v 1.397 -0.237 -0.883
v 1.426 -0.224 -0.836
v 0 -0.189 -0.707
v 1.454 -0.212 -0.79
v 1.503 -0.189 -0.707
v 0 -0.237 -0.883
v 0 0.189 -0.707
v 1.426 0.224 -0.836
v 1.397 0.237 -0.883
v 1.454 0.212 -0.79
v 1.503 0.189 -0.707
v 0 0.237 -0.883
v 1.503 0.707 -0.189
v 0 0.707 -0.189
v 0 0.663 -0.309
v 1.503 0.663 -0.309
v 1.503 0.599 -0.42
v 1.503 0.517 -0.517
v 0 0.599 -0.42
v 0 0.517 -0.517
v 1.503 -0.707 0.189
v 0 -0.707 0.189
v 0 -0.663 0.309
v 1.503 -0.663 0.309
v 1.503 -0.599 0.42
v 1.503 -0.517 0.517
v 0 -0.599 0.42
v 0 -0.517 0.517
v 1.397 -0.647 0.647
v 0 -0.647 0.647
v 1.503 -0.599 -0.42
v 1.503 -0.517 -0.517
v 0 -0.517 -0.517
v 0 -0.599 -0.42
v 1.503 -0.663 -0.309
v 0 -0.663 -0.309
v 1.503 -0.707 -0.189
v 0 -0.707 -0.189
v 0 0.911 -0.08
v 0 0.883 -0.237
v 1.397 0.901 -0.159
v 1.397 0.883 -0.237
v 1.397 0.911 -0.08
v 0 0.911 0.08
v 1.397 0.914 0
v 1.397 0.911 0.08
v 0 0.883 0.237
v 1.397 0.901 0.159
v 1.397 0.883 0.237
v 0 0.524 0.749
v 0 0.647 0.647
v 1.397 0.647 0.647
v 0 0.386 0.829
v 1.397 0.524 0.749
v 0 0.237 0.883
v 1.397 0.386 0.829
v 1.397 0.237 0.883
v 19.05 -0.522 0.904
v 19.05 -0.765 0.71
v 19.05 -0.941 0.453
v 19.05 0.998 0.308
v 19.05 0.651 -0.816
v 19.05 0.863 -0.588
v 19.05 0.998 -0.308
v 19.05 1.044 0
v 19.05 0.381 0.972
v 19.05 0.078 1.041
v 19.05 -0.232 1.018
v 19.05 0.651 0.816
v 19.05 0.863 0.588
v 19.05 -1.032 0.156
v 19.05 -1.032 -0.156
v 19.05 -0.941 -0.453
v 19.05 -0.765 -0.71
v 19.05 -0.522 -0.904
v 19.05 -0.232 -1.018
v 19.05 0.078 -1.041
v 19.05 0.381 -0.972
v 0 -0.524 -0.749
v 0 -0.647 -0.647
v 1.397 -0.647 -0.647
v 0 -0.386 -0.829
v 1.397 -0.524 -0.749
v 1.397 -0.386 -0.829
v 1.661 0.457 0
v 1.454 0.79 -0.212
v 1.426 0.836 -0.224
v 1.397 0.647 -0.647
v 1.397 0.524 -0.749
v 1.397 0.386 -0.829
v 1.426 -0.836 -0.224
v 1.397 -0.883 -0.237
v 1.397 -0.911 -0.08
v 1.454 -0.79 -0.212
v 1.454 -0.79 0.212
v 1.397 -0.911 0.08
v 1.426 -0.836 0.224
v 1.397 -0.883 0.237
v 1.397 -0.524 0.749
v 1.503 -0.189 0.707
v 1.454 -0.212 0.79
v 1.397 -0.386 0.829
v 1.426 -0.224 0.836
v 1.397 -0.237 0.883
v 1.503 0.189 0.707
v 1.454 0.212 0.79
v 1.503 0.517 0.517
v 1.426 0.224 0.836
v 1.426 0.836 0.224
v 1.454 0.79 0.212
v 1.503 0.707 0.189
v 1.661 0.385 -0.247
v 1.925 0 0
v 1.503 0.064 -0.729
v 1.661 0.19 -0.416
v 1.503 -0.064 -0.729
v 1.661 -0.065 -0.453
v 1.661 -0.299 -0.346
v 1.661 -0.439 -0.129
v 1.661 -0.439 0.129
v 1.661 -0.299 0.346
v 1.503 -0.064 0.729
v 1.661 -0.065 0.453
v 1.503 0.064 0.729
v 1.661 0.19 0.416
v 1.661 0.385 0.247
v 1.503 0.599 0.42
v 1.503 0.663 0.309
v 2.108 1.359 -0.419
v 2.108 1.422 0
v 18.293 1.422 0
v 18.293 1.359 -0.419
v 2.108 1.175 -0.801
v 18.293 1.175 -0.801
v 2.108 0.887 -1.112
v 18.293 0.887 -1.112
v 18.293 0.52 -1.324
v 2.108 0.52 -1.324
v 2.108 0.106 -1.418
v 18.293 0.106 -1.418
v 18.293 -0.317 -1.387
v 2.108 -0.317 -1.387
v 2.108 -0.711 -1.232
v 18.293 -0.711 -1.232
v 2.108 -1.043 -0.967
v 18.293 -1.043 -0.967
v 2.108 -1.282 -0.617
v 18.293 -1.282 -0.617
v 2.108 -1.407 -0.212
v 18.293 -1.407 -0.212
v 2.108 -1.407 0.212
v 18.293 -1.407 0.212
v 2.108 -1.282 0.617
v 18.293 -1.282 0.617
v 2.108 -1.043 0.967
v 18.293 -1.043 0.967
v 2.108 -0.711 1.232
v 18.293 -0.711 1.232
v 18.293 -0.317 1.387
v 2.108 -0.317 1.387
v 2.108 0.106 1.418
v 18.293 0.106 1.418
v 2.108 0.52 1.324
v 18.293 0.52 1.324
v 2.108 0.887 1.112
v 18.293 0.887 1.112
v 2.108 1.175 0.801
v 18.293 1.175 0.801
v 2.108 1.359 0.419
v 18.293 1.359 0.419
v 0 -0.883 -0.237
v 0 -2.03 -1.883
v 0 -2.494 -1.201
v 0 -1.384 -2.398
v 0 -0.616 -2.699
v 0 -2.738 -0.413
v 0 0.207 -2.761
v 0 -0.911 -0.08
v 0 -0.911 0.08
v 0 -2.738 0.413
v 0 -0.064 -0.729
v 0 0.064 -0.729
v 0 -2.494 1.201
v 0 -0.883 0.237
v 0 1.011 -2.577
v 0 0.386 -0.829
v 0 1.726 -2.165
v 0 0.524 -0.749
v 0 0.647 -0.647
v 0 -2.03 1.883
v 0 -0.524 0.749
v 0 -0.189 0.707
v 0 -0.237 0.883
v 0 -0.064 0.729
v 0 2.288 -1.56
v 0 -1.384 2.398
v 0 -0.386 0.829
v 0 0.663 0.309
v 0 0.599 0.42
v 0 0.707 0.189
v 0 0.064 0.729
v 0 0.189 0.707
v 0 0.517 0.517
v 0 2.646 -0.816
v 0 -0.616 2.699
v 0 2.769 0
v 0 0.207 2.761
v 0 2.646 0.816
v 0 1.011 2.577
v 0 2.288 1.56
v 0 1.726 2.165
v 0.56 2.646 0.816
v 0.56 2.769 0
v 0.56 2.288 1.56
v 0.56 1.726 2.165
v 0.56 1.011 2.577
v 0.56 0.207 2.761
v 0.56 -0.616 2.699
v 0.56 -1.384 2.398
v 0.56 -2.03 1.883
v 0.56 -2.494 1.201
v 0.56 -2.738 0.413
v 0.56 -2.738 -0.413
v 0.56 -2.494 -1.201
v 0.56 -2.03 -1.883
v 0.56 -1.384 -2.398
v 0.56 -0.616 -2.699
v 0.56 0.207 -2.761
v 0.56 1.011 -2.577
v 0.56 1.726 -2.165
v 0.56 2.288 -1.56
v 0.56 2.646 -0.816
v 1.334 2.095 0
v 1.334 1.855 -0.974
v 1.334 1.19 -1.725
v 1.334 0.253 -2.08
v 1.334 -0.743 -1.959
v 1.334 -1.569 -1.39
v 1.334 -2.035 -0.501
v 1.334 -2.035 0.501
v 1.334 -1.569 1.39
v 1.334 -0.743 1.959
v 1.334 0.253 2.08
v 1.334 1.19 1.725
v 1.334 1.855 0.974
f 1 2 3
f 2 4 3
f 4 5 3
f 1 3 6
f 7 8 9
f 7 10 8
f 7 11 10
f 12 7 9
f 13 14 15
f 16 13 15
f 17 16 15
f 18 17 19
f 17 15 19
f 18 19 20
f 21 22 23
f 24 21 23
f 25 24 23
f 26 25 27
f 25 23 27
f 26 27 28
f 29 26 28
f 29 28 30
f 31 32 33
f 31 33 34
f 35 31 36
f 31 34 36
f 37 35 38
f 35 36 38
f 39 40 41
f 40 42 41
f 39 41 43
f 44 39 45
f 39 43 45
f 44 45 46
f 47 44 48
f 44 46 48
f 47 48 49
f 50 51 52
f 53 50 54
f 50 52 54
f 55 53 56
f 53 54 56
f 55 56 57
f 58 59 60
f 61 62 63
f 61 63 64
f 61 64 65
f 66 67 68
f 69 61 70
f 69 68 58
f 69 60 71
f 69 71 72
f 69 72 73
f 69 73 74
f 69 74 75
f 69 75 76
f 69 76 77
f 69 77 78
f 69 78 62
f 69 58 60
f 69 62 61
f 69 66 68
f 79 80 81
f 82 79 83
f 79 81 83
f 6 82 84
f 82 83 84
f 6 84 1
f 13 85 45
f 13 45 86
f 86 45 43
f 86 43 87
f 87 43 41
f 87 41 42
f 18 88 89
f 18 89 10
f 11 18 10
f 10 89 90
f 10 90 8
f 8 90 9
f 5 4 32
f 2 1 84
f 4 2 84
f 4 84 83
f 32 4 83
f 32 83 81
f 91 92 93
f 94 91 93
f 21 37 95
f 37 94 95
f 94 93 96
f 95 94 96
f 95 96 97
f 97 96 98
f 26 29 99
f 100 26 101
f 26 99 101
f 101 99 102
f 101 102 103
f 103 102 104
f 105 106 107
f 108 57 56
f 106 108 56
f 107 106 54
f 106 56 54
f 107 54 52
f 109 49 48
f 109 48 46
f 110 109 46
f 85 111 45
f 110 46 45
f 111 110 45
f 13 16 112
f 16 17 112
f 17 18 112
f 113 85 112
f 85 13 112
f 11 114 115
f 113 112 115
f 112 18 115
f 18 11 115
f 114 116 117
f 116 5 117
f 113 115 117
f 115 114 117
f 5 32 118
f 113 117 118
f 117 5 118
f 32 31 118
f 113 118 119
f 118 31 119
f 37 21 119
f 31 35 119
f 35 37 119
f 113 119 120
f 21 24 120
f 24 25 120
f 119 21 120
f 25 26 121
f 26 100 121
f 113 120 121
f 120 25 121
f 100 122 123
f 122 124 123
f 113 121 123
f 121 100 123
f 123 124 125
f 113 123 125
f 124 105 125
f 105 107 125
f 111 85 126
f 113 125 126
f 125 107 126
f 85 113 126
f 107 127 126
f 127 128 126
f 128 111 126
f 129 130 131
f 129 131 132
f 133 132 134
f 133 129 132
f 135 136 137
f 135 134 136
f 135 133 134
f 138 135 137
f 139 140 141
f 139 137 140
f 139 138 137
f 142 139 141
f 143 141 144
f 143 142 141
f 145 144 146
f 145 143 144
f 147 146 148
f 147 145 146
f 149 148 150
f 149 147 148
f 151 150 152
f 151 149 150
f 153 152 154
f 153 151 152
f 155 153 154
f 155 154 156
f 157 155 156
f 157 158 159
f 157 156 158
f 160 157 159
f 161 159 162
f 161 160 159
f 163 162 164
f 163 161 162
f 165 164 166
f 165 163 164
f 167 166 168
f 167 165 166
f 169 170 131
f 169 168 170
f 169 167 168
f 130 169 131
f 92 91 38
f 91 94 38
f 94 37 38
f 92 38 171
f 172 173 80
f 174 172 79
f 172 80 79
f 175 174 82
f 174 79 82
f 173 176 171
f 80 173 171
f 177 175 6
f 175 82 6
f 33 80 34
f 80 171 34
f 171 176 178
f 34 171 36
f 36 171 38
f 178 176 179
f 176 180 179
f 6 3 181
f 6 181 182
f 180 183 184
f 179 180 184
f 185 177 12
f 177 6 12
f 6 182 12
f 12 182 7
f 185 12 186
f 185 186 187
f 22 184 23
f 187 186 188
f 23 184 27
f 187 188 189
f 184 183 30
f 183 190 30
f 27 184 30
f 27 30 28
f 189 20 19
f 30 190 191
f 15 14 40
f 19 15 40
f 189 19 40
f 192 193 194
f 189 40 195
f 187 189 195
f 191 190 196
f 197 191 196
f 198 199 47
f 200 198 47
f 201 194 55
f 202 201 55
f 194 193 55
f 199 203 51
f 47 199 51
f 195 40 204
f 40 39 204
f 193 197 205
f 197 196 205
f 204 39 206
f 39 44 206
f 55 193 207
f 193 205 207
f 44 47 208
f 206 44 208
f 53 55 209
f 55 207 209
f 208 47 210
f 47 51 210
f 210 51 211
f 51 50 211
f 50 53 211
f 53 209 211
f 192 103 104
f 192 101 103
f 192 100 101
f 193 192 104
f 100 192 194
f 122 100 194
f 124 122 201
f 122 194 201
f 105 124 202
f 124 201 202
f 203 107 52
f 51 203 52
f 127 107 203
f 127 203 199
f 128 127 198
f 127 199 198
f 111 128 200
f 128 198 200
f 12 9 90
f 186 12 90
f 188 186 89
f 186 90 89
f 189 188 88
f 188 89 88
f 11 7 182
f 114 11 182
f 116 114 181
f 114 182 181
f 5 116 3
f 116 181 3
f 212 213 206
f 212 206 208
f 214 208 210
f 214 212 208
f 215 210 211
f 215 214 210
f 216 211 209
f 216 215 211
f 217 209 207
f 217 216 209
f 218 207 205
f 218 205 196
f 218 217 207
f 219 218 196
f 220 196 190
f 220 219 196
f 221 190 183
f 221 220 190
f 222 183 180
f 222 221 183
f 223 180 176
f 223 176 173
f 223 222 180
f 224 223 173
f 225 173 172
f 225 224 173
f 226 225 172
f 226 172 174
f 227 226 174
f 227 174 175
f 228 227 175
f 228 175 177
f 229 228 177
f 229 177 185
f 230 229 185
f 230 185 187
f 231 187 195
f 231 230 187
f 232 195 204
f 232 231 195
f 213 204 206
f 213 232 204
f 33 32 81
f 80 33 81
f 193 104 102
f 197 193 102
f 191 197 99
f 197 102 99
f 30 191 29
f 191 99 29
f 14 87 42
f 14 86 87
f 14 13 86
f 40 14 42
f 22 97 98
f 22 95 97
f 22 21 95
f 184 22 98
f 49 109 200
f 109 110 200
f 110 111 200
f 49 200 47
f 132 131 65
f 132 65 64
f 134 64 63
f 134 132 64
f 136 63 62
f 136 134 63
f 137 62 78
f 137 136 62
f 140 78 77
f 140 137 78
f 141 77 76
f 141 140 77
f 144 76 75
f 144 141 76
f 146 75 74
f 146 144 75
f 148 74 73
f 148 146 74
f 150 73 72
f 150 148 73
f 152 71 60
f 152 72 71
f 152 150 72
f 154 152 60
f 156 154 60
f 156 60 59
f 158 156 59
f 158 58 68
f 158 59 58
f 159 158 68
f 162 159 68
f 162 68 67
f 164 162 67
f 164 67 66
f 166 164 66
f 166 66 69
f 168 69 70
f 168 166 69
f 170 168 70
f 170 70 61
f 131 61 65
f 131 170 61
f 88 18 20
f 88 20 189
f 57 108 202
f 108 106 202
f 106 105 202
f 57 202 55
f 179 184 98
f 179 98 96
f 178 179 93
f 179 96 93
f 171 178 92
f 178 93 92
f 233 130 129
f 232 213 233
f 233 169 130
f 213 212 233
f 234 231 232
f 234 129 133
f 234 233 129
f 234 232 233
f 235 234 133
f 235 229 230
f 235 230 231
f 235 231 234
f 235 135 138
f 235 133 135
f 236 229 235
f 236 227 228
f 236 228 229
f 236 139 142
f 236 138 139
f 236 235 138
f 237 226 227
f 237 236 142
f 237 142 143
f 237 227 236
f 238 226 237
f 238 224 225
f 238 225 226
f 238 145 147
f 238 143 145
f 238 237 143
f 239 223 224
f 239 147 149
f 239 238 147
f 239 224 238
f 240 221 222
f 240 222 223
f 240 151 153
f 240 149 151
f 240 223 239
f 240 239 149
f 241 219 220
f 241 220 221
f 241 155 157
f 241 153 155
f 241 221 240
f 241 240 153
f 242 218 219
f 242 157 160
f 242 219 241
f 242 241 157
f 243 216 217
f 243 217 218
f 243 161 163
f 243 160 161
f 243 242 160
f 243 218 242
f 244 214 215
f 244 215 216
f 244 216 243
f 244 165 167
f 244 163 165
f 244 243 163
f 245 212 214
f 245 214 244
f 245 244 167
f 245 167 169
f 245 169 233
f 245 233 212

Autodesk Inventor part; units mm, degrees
ref_plane "YZ Plane" through (0, 0, 0) normal (1, 0, 0) x (0, 1, 0)
ref_plane "XZ Plane" through (0, 0, 0) normal (0, 1, 0) x (-1, 0, 0)
sketch "Szkic1" plane through (0, 0, 0) normal (0, 0, 1) x (1, 0, 0)
  line L0 (19.05, 0) -> (19.05, 1.4224)
  line L1 (19.05, 1.4224) -> (2.1082, 1.4224)
  line L2 (0, 2.7686) -> (0, 0.9144)
  line L3 (0, 0.9144) -> (1.397, 0.9144)
  line L4 (1.397, 0.9144) -> (1.9249, 0)
  line L5 (1.9249, 0) -> (19.05, 0)
  line L6 (0, 2.7686) -> (0.5596, 2.7686)
  line L7 (0.5596, 2.7686) -> (2.1082, 1.4224)
  line L8 (-3.81, 0) -> (22.86, 0) projected
  line L9 (0, -0.5537) -> (0, 3.3223) projected
  dimension "d0" = 19.05
  dimension "d1" = 1.397
  dimension "d2" = 2.8448
  dimension "d3" = 2.1082
  dimension "d4" = 41
  dimension "d5" = 1.8288
  dimension "d6" = 60
  dimension "d7" = 5.5372
revolve "Bryła" add sketch "Szkic1" angle 360 about axis through (1.9249, 0, 0) along (1, 0, 0) contours L5 L4 L3 L2 L6 L7 L1 L0
sketch "Szkic2" plane through (0, 0, 0) normal (-1, 0, 0) x (0, 0, 1)
  circle A0 centre (0, 0) radius 2.7686 projected
  circle A1 centre (0, 0) radius 0.9144 projected
  line L0 (0.7066, 0.1893) -> (0.8832, 0.2367)
  line L1 (0.7066, -0.1893) -> (0.8832, -0.2367)
  arc A2 (0.7066, -0.1893) -> (0.7066, 0.1893) centre (0, 0) ccw
  arc A3 (0.8832, -0.2367) -> (0.8832, 0.2367) centre (0, 0) ccw
  line L2 (0, -3.876) -> (0, 3.876) projected
  line L3 (-3.876, 0) -> (3.876, 0) projected
  line L4 (0.7066, 0.1893) -> (0, 0) construction
  line L5 (0, 0) -> (0.7066, -0.1893) construction
  line L6 (0.1893, 0.7066) -> (0.2367, 0.8832)
  line L7 (0.5173, 0.5173) -> (0.6466, 0.6466)
  arc A4 (0.5173, 0.5173) -> (0.1893, 0.7066) centre (0, 0) ccw
  arc A5 (0.6466, 0.6466) -> (0.2367, 0.8832) centre (0, 0) ccw
  line L8 (-0.5173, 0.5173) -> (-0.6466, 0.6466)
  line L9 (-0.1893, 0.7066) -> (-0.2367, 0.8832)
  arc A6 (-0.1893, 0.7066) -> (-0.5173, 0.5173) centre (0, 0) ccw
  arc A7 (-0.2367, 0.8832) -> (-0.6466, 0.6466) centre (0, 0) ccw
  line L10 (-0.7066, -0.1893) -> (-0.8832, -0.2367)
  line L11 (-0.7066, 0.1893) -> (-0.8832, 0.2367)
  arc A8 (-0.7066, 0.1893) -> (-0.7066, -0.1893) centre (0, 0) ccw
  arc A9 (-0.8832, 0.2367) -> (-0.8832, -0.2367) centre (0, 0) ccw
  line L12 (-0.1893, -0.7066) -> (-0.2367, -0.8832)
  line L13 (-0.5173, -0.5173) -> (-0.6466, -0.6466)
  arc A10 (-0.5173, -0.5173) -> (-0.1893, -0.7066) centre (0, 0) ccw
  arc A11 (-0.6466, -0.6466) -> (-0.2367, -0.8832) centre (0, 0) ccw
  line L14 (0.5173, -0.5173) -> (0.6466, -0.6466)
  line L15 (0.1893, -0.7066) -> (0.2367, -0.8832)
  arc A12 (0.1893, -0.7066) -> (0.5173, -0.5173) centre (0, 0) ccw
  arc A13 (0.2367, -0.8832) -> (0.6466, -0.6466) centre (0, 0) ccw
  dimension "d8" = 1.463
  dimension "d9" = 1.8288
  dimension "d10" = 15
  dimension "d11" = 15
  dimension "d22" = 360
extrude "Szczelina" add sketch "Szkic2" against normal up to next contours L3 A2 L0 A1 | A1 L1 A2 L3 | L3 A8 L10 A1 | A1 L11 A8 L3 | A1 L7 A4 L6 | L9 A6 L8 A1 | A1 L13 A10 L12 | L15 A12 L14 A1
thread "Gwint" size "4-40 UNC" class "2A" standard "ANSI Unified Screw Threads" length 15.3543
chamfer "Faza1" distance 0.3785 distance2 0.7569 1 edges at (19.05, -1.4224, 0) measured on face at (19.05, 0.5253, 0.4213)
ref_plane "Work Plane1" through (66.6877, 0, 0) normal (0, 0, -1) x (1, 0, 0)
equation "\"d0\" = NLG"
equation "\"d1\" = INTI"
equation "\"d2\" = GD"
equation "\"d3\" = KOH"
equation "\"d4\" = 0.5 * SEWI"
equation "\"d5\" = SW"
equation "\"d7\" = KOD"
equation "\"d8\" = 0.8 * SW"
equation "\"d9\" = SW"
equation "\"d15\" = GEL"
equation "\"d17\" = -0.5 * SPD + 0.5 * GD"
equation "\"d18\" = GUL"
equation "\"NLG\" = 19.05"
equation "\"SW\" = 1.8288"
equation "\"INTI\" = 1.397"
equation "\"GEL\" = 15.3543"
equation "\"KOH\" = 2.1082"
equation "\"KOD\" = 5.5372"
equation "\"GUL\" = 0.75692"
equation "\"SPD\" = 2.08788"
equation "\"GD\" = NND"
equation "\"SEWI\" = 82deg"
equation "\"TOA\" = 30deg"
equation "\"GD1\" = SPD"
equation "\"EPV\" = 3.74448"
equation "\"THREADDIA\" = 2.8448"
equation "\"BDM\" = NND"
equation "\"NND\" = 2.8448"
equation "\"GAL\" = 1.5875"
equation "\"E0\" = 1.155 * SW"
properties part number "ANSI B18.3 - 4-40 UNC x 0,75" material "Stal, miękka"
